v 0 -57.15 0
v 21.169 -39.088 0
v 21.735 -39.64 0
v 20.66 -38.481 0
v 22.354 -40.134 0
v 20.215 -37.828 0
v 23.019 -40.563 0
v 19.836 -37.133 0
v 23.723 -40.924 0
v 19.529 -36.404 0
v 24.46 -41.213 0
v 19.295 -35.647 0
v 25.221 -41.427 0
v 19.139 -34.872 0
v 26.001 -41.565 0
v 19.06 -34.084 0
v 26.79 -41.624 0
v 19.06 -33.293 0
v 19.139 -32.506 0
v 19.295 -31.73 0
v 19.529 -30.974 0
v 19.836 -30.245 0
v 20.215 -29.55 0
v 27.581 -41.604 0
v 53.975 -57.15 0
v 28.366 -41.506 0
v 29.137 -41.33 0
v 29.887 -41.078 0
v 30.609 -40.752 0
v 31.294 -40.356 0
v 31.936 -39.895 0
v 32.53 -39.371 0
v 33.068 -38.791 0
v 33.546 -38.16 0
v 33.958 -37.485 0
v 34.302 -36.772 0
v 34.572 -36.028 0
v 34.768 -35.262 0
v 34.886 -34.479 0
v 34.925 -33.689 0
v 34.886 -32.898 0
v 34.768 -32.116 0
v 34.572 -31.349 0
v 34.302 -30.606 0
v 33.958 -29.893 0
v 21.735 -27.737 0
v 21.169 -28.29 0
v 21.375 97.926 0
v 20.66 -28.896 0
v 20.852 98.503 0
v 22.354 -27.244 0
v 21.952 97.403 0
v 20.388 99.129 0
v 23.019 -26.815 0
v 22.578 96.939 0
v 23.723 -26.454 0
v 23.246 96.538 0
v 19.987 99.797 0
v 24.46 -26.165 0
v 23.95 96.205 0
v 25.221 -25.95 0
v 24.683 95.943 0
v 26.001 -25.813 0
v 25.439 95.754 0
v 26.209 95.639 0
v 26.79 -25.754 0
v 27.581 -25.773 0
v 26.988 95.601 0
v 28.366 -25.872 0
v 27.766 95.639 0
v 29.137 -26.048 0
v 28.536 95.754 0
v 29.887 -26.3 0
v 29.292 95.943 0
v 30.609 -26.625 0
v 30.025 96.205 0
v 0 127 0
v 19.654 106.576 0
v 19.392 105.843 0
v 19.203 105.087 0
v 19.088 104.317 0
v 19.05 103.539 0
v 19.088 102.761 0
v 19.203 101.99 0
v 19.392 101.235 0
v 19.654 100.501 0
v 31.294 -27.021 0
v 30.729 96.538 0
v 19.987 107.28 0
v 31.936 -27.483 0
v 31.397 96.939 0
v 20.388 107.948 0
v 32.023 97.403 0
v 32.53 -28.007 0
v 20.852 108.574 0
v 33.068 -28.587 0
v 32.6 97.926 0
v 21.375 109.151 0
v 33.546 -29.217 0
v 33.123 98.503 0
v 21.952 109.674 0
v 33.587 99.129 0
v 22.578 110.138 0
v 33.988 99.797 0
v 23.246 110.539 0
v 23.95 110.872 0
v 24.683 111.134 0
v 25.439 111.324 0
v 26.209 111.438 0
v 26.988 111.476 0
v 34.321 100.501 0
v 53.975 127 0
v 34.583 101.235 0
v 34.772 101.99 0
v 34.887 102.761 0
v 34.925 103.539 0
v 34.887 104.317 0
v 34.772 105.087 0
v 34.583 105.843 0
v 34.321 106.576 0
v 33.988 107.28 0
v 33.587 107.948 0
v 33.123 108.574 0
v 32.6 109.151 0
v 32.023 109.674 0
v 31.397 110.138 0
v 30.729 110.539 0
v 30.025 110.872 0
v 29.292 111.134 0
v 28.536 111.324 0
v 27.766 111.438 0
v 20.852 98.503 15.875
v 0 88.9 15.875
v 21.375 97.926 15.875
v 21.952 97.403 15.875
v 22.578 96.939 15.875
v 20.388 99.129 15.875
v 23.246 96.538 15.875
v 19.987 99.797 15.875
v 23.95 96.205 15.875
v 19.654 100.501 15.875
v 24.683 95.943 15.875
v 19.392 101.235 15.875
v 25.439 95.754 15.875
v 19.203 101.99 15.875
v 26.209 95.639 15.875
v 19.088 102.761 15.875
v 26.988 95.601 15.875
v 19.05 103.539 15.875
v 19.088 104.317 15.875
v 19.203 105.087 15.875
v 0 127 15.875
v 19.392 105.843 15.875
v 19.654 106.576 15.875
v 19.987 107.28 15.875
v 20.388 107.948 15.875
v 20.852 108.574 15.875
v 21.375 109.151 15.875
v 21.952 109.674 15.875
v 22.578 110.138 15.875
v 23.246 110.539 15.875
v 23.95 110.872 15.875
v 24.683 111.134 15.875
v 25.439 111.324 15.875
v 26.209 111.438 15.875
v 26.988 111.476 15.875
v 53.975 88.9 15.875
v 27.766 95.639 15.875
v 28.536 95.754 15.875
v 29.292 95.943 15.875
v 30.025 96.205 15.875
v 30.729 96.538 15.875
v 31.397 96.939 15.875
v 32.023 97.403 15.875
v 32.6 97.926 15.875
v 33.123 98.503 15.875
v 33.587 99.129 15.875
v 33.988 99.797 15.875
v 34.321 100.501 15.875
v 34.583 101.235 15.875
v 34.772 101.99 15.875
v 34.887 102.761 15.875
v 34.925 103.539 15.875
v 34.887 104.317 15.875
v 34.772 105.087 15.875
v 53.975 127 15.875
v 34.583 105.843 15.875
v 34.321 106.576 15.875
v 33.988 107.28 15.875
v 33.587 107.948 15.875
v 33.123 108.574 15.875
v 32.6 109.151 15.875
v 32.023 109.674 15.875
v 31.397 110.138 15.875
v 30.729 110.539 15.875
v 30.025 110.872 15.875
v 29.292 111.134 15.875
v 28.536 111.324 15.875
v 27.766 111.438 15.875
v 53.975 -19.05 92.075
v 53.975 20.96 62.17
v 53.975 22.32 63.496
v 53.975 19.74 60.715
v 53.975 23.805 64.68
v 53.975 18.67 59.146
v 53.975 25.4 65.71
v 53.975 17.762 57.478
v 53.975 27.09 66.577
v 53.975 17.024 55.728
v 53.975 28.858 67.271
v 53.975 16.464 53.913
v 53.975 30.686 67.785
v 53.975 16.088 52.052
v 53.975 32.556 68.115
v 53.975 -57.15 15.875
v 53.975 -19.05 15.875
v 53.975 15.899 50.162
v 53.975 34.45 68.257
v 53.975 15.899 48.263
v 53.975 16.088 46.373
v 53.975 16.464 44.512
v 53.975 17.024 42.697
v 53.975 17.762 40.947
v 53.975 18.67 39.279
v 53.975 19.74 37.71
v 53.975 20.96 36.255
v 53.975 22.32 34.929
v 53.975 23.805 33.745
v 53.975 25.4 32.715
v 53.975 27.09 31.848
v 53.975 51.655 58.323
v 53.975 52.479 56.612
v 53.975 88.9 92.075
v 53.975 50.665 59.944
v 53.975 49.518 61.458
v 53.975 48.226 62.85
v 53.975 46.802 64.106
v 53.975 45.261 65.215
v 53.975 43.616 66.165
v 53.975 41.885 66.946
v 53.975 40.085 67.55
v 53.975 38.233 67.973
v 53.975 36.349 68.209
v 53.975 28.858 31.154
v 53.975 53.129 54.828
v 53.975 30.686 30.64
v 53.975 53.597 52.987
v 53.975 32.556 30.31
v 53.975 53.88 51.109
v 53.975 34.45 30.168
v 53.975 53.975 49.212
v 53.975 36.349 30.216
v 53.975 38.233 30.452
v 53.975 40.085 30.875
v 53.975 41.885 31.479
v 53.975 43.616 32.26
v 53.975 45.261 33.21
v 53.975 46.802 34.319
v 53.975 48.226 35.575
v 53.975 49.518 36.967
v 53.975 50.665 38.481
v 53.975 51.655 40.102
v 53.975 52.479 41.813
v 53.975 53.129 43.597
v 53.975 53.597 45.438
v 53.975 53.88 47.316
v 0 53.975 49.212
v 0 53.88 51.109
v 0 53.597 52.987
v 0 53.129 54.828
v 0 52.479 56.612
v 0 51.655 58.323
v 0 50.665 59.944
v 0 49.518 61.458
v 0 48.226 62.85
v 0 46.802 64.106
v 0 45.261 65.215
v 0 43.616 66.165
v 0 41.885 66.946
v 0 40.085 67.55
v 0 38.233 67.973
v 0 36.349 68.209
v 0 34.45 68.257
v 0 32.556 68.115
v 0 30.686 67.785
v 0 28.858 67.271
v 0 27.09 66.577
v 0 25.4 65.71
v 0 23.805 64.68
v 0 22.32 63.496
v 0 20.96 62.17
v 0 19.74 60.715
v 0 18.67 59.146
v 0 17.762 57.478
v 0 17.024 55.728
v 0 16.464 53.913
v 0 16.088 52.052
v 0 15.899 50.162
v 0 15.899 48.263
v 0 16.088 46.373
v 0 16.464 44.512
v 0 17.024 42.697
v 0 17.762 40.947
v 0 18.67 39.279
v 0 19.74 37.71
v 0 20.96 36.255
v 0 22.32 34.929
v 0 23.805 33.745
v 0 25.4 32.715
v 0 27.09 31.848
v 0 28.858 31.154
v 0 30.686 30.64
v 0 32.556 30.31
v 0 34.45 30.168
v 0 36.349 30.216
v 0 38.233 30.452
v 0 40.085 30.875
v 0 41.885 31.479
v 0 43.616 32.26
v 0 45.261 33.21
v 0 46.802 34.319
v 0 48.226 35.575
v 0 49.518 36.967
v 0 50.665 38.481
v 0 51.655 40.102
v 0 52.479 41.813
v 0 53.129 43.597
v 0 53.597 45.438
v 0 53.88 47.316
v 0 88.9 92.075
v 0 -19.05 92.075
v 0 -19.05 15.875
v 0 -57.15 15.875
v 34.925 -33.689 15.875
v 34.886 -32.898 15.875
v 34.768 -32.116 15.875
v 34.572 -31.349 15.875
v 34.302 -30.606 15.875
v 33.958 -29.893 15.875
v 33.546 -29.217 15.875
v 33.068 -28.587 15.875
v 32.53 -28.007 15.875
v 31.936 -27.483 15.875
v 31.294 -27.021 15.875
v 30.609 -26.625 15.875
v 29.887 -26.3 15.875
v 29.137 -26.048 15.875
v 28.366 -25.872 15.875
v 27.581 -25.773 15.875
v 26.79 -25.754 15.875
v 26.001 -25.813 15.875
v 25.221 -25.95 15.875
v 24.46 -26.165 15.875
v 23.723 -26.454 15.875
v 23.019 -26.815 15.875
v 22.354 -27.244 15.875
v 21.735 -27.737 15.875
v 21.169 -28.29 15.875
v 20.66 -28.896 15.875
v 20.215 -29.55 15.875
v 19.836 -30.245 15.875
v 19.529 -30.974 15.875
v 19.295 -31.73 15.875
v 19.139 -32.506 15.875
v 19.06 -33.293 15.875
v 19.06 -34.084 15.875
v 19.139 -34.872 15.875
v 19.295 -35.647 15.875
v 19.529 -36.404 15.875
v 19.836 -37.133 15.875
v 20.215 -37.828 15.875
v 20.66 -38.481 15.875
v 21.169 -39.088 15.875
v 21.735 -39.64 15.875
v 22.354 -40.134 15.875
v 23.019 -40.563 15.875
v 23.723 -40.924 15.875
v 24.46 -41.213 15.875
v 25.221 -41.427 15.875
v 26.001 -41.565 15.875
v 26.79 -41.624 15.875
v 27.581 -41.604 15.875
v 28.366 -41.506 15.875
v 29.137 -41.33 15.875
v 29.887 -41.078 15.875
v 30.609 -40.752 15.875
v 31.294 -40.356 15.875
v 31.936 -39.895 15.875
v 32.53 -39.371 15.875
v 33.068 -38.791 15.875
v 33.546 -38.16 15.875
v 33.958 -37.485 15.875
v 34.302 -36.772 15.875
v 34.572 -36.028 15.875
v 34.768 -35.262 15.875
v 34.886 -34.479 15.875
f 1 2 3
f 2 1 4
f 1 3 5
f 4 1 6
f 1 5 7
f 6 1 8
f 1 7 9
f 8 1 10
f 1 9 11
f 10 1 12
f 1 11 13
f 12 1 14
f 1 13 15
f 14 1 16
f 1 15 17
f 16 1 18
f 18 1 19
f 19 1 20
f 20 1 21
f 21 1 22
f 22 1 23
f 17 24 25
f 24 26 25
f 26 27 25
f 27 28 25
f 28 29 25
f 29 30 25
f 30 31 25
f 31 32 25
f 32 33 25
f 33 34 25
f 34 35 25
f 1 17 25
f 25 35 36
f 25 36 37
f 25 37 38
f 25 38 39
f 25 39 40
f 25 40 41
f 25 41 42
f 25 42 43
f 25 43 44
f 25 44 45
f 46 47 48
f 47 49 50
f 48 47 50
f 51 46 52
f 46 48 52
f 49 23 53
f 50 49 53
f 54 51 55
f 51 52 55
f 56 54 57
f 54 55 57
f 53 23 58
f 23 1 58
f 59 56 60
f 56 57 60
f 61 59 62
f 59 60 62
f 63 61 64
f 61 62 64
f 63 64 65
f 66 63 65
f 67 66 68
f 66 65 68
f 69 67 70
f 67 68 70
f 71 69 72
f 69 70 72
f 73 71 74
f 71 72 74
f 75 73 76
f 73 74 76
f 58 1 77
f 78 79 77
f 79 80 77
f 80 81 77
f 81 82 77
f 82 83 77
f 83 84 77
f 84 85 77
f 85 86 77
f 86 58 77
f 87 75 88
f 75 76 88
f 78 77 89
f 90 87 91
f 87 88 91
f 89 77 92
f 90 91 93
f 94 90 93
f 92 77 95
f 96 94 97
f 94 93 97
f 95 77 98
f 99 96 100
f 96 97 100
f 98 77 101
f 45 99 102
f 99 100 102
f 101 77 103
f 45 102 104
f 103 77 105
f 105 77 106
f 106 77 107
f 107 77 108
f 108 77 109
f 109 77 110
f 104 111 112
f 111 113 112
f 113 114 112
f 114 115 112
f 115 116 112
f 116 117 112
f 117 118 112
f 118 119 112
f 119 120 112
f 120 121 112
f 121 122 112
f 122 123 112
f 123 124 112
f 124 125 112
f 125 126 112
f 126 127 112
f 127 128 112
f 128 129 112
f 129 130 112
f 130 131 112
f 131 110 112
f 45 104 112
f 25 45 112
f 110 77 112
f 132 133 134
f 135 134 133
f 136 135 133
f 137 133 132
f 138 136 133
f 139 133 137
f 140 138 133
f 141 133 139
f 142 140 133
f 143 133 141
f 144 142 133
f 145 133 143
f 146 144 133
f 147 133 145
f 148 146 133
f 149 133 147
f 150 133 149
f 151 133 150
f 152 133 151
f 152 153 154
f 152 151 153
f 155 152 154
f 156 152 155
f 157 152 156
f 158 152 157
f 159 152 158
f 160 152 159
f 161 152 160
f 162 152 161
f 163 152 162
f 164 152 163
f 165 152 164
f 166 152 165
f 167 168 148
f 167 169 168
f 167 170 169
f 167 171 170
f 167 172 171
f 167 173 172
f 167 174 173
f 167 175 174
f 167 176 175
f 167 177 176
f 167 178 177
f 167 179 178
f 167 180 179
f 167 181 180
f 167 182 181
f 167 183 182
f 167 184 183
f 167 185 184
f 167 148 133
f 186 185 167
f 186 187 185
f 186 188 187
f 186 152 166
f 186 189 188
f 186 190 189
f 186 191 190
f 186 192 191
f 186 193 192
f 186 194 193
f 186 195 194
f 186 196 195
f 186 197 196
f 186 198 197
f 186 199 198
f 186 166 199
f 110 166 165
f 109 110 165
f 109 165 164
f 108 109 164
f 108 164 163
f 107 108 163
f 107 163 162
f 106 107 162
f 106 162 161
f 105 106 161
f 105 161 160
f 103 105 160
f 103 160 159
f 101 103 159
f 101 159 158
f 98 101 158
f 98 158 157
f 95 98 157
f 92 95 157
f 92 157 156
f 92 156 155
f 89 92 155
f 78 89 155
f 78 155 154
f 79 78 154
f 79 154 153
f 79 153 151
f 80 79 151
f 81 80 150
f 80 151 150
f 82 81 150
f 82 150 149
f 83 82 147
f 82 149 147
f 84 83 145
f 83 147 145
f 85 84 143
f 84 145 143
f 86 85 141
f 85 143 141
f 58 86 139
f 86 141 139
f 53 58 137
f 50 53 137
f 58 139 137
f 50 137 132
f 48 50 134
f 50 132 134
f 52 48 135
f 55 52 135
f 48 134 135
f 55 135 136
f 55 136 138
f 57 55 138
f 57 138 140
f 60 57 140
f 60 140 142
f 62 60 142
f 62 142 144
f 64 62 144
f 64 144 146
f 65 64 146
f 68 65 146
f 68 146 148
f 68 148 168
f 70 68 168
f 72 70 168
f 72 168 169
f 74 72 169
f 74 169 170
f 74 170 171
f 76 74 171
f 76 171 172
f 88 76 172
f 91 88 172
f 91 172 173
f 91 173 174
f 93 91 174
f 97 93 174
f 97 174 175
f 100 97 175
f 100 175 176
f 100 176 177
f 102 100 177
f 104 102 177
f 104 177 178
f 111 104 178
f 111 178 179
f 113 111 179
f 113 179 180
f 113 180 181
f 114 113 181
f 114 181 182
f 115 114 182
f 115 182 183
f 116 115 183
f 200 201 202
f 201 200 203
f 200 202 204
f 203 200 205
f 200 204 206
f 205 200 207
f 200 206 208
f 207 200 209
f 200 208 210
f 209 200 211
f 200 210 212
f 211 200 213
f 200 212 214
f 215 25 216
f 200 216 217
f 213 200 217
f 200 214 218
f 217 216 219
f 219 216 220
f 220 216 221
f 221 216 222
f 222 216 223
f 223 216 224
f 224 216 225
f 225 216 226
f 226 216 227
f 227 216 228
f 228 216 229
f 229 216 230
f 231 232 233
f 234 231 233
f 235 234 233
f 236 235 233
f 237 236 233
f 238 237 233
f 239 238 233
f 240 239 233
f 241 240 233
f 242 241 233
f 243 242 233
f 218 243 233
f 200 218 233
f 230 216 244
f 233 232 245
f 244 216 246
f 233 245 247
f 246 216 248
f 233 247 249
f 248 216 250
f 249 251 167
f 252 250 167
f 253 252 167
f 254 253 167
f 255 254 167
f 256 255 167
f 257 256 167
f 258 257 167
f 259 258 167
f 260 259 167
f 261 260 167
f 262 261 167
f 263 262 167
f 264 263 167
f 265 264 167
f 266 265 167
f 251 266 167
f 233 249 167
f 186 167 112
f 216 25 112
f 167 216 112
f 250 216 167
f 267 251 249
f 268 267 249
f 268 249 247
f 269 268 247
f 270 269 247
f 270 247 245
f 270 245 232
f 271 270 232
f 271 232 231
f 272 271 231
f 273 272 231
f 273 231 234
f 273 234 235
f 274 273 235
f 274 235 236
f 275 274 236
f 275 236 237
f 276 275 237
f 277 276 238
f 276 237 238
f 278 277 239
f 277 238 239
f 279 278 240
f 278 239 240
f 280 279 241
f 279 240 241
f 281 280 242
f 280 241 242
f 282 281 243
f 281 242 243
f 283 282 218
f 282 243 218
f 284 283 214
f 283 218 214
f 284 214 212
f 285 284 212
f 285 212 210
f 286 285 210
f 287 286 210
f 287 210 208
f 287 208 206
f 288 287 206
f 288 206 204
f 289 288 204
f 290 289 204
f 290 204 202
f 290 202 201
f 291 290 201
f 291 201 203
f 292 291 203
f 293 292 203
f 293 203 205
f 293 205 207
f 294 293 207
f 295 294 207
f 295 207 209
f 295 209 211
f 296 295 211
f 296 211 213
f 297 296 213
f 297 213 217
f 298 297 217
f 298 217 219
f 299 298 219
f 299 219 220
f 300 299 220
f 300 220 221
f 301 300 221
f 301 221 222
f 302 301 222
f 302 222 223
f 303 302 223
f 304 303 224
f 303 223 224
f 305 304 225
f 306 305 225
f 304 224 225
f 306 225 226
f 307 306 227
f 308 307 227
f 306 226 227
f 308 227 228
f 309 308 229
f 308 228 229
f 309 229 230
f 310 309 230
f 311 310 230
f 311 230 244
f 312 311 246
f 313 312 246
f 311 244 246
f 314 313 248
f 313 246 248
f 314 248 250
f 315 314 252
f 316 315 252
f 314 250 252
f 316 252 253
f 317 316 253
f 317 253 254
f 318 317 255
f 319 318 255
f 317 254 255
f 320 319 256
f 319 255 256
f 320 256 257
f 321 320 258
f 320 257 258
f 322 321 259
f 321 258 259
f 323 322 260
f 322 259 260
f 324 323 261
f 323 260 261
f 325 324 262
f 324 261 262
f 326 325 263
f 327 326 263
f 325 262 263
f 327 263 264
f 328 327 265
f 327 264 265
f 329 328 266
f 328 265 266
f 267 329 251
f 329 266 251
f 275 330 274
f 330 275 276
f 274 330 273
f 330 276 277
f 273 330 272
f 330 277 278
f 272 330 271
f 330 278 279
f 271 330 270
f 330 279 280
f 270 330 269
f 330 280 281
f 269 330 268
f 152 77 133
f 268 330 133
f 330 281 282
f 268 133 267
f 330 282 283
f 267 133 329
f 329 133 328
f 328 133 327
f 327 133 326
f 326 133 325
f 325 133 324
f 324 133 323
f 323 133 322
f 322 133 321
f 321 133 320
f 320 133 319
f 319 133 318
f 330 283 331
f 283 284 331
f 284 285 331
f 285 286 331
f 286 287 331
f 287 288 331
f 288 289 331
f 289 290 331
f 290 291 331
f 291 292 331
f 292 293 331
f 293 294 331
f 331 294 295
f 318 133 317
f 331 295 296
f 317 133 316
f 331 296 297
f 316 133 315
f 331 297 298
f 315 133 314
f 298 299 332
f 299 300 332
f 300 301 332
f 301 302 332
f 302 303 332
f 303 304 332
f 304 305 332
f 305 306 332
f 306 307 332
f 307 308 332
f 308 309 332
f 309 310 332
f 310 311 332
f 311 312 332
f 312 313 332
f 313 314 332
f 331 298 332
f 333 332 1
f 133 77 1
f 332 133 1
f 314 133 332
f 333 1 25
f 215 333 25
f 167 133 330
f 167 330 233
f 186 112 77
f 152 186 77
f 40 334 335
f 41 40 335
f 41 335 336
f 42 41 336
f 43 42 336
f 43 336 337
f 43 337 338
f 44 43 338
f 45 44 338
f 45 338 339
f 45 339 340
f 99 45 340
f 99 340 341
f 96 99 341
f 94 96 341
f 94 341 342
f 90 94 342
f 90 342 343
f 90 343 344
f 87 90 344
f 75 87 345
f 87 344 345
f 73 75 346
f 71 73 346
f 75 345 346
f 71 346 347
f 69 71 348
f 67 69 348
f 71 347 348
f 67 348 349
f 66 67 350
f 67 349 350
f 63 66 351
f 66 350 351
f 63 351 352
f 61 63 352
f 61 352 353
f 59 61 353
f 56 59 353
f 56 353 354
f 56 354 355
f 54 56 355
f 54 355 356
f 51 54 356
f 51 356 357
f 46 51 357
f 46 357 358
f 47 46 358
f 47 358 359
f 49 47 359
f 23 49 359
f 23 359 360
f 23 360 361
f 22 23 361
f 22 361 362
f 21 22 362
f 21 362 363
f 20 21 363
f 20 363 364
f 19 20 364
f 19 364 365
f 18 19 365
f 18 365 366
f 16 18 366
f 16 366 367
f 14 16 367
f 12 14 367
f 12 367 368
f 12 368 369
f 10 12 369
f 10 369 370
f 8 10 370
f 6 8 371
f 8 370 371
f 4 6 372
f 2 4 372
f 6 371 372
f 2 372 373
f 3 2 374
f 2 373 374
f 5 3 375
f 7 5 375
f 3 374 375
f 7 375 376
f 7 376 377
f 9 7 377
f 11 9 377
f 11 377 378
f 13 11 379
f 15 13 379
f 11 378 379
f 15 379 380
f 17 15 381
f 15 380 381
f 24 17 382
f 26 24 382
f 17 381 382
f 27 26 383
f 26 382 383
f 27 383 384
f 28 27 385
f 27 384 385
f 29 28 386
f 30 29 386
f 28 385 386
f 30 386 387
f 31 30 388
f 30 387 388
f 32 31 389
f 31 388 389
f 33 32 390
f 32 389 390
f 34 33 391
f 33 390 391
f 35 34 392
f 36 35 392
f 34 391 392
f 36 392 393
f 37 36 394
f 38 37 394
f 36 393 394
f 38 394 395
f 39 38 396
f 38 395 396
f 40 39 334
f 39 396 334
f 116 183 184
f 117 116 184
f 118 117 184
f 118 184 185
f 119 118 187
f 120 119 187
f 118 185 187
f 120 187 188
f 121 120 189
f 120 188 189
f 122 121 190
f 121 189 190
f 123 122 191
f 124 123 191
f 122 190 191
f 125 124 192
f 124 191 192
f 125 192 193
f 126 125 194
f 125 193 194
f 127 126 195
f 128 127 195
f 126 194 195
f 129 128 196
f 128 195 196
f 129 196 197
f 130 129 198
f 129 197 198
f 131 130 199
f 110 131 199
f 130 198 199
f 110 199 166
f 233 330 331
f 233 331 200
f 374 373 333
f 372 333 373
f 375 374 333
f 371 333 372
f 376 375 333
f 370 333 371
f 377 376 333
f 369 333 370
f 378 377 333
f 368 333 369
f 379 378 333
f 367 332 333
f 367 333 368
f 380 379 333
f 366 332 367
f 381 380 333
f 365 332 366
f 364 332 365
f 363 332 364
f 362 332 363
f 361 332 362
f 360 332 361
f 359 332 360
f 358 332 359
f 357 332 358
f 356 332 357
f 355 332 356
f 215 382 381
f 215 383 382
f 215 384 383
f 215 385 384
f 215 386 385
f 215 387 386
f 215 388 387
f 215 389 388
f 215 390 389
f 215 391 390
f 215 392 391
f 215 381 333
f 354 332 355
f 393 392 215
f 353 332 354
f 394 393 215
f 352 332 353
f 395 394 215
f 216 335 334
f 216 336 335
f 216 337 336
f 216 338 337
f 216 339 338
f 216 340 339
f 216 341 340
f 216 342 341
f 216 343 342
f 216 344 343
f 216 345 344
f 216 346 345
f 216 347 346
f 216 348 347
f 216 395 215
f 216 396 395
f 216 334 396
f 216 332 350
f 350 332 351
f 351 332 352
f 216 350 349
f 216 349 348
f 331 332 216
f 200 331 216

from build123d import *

# Parameters (mm, degrees)
F1_DEPTH = 15.875
F2_W     = 53.975
F2_H     = 107.95
F3_DEPTH = 76.2
F4_R     = 19.05
F5_DEPTH = 76.2
F7_DEPTH = 76.2
F8_R     = 7.9375
F9_DEPTH = 25.4


with BuildPart() as f1:
    # F0 (on Top) → F1 (new body)
    with BuildSketch(Plane.XY):
        Polygon((0, 127), (0, 0), (0, -57.15), (53.975, -57.15), (53.975, 127), align=None)
    extrude(amount=F1_DEPTH)

    # F2 (on face) → F3 (join)
    with BuildSketch(Plane.XY.offset(15.875)):
        with Locations((26.9875, 34.925)):
            Rectangle(F2_W, F2_H)
    extrude(amount=F3_DEPTH)

    # F4 (on face) → F5 (cut)
    with BuildSketch(Plane.YZ.offset(53.975)):
        with Locations((34.925, 49.2125)):
            Circle(F4_R)
    extrude(amount=-F5_DEPTH, mode=Mode.SUBTRACT)

    # F6 (on face) → F7 (cut)
    with BuildSketch(Plane.XY.offset(15.875)):
        with BuildLine():
            ThreePointArc((26.9875, 111.476155), (21.37484, 97.925995), (34.925, 103.538655))
            ThreePointArc((34.925, 103.538655), (32.60016, 109.151315), (26.9875, 111.476155))
        make_face()
    extrude(amount=-F7_DEPTH, mode=Mode.SUBTRACT)

    # F8 (on face) → F9 (cut)
    with BuildSketch(Plane.XY.offset(15.875)):
        with Locations((26.9875, -33.688782)):
            Circle(F8_R)
    extrude(amount=-F9_DEPTH, mode=Mode.SUBTRACT)


solid = f1.part
